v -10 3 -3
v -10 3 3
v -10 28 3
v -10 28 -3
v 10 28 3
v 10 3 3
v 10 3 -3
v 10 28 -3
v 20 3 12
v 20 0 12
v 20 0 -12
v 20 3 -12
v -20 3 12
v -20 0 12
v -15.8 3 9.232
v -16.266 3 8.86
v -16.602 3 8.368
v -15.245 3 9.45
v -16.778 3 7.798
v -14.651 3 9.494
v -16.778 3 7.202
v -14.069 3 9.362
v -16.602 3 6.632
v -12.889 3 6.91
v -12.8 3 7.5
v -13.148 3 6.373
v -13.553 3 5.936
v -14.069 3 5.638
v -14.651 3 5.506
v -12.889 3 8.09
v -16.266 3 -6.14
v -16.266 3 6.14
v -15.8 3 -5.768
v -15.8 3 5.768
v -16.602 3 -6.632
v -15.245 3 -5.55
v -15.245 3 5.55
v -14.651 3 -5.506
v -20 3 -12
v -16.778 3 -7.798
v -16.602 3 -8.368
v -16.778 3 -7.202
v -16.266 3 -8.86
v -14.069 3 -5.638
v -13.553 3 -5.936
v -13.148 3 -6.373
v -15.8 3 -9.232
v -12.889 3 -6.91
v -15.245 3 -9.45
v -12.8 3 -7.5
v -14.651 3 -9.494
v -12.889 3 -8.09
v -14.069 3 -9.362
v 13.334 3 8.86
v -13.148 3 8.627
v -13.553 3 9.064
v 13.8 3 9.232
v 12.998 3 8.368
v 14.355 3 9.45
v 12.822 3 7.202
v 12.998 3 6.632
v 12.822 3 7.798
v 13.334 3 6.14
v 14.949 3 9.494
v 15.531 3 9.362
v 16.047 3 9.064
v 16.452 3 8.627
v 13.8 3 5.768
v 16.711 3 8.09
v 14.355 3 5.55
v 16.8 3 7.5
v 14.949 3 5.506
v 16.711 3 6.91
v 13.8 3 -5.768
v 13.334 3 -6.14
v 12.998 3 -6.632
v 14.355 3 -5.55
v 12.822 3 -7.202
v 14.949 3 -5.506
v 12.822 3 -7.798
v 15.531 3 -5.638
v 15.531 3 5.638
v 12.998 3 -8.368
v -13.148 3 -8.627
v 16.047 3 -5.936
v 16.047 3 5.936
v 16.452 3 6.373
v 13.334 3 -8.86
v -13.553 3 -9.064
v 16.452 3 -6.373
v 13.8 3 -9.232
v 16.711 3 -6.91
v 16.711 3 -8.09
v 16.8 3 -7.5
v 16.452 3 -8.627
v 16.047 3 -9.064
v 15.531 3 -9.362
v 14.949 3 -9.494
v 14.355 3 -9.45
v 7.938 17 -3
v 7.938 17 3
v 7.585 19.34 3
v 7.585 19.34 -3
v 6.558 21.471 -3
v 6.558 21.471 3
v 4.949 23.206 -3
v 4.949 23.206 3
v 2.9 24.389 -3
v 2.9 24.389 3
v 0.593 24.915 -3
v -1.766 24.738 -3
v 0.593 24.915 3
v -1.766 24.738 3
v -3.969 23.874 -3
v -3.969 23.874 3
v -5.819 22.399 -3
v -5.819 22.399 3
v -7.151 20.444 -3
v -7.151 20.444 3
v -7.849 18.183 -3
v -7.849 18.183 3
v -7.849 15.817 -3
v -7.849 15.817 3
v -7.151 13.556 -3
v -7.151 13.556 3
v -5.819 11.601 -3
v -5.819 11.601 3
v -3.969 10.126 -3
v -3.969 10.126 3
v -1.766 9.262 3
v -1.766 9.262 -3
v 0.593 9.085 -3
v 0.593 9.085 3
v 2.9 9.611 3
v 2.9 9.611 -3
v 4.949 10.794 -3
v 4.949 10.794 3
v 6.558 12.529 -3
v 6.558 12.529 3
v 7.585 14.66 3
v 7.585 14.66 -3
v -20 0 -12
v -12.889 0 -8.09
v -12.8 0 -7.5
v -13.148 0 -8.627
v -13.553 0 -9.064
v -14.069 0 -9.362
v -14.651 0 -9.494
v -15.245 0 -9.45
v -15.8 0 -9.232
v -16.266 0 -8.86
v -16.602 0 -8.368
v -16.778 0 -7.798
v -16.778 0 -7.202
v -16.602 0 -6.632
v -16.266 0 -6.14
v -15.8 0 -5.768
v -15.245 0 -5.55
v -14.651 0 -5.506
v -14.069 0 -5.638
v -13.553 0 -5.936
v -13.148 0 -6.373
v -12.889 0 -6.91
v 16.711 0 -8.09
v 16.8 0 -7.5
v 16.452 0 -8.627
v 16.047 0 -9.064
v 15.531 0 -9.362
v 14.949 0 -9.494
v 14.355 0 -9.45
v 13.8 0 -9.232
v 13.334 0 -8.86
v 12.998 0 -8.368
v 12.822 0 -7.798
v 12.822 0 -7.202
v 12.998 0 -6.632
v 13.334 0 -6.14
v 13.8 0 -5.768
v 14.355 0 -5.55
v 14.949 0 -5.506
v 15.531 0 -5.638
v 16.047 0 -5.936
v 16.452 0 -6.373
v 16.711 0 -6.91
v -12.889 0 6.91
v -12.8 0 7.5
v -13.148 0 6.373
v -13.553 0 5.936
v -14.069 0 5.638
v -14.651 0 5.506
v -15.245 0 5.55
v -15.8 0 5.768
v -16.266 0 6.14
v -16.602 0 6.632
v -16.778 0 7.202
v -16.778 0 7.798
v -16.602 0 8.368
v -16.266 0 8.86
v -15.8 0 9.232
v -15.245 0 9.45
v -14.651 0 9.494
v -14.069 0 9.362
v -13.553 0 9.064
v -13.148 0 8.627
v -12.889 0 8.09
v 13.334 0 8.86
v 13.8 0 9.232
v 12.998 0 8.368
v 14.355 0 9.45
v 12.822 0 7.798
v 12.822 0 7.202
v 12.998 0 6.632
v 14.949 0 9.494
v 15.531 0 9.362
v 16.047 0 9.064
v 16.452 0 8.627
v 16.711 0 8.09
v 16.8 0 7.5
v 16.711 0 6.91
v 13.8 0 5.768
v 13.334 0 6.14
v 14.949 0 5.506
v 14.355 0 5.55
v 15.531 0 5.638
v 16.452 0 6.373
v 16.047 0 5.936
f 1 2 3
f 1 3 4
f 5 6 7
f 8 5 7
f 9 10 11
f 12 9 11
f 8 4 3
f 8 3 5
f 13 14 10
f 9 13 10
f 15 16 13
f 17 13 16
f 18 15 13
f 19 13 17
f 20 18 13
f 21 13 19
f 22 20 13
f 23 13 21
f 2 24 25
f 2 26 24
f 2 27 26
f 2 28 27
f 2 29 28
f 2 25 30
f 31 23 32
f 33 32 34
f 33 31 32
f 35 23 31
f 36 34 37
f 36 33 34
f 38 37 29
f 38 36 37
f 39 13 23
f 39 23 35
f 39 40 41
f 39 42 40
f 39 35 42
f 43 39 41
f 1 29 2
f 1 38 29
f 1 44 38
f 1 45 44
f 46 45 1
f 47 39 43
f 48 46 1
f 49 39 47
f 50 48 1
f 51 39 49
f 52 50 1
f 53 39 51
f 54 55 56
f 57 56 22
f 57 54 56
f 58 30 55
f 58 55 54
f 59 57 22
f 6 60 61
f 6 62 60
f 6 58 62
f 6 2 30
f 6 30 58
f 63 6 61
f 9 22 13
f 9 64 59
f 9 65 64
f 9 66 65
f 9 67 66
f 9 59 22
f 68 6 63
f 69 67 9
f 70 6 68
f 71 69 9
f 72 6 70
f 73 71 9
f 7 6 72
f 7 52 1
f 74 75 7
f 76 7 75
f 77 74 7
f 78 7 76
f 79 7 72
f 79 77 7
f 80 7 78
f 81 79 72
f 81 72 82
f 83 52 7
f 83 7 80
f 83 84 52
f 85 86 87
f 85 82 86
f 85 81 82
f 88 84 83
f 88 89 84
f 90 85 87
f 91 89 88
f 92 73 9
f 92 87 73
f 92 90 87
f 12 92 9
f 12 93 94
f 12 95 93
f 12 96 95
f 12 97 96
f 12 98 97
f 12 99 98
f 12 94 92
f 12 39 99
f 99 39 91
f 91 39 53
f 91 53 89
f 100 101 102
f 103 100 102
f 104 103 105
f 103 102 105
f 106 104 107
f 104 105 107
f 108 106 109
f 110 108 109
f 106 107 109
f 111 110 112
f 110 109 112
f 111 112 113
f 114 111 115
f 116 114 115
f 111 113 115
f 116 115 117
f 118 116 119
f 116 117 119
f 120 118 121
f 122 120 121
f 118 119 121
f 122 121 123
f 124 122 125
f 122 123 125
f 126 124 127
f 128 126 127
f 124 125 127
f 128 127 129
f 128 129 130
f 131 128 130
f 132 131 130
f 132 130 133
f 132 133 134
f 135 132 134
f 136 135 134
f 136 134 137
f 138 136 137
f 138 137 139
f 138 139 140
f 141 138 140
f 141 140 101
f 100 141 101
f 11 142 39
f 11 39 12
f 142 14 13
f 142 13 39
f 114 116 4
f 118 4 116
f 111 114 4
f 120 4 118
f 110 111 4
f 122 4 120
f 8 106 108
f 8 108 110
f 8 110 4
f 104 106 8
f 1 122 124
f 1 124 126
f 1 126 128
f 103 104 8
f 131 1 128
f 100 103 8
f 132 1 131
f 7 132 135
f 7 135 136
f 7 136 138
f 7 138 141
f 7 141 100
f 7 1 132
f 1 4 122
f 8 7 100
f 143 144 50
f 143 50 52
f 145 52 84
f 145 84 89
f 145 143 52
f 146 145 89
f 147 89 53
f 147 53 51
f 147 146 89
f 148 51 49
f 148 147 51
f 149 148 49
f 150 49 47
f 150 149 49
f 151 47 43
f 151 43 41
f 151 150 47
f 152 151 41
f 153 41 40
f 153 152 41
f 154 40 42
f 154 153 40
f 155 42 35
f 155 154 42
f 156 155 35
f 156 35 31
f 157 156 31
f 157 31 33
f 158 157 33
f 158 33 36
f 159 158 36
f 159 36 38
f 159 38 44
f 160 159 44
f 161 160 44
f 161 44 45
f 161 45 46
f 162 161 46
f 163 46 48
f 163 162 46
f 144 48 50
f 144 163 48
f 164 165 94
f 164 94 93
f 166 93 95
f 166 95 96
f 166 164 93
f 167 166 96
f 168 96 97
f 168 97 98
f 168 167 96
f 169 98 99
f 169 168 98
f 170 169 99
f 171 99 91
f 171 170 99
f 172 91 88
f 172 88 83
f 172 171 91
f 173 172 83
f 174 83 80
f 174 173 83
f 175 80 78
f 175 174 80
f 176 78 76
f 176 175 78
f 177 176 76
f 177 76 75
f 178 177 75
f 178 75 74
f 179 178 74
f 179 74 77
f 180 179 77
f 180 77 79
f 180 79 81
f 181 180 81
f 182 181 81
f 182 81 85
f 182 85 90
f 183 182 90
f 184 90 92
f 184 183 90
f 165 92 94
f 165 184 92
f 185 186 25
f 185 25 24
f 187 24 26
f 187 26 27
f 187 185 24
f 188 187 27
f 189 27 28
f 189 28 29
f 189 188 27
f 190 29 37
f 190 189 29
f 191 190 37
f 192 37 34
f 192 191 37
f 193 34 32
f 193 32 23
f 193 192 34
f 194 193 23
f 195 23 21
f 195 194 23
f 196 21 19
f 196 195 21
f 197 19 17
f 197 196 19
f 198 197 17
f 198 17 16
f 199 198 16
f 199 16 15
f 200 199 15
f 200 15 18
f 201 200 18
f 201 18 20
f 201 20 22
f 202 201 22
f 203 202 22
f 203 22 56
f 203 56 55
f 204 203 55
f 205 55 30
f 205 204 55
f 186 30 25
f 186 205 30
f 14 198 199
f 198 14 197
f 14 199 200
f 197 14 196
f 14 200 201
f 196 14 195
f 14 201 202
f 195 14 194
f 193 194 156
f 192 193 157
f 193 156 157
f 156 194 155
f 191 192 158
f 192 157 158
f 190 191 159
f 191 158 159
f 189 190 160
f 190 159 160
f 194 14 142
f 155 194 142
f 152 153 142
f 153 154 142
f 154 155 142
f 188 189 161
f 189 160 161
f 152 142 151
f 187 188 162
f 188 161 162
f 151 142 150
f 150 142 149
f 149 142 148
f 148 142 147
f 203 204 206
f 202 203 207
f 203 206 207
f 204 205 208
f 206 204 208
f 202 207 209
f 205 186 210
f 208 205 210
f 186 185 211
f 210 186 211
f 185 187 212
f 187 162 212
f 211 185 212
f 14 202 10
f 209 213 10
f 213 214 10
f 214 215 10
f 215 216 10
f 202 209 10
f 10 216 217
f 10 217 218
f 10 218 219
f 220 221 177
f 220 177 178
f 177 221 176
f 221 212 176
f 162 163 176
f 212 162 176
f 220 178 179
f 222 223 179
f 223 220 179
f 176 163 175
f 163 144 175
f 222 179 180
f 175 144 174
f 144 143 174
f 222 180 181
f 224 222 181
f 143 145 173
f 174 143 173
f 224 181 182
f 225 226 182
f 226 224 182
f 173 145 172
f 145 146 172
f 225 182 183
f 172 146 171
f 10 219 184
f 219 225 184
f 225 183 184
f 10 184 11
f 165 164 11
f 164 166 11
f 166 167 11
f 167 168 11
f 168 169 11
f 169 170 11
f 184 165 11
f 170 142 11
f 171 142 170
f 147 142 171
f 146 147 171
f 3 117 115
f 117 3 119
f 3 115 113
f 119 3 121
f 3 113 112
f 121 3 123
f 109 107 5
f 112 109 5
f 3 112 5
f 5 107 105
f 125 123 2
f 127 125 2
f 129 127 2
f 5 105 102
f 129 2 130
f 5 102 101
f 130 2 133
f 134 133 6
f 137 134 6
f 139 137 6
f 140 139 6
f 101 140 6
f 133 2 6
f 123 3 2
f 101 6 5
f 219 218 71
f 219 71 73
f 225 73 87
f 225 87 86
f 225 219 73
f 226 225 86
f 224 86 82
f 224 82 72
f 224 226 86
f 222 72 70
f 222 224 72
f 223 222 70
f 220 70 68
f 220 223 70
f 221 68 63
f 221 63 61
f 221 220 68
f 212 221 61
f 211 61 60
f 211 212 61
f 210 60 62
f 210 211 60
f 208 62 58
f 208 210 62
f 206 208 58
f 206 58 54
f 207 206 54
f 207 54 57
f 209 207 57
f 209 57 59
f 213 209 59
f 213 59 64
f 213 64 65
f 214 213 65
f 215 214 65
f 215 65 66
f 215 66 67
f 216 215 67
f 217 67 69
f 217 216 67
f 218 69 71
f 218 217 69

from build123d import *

# Parameters (mm, degrees)
SKETCH_1_W          = 40
SKETCH_1_H          = 24
SKETCH_1_R          = 2
EXTRUDE_1_DEPTH     = 3
SKETCH_2_W          = 20
SKETCH_2_H          = 6
EXTRUDE_2_DEPTH     = 25
SKETCH_3_R          = 7.9375
CUT_EXTRUDE_1_DEPTH = 10


with BuildPart() as part:
    # 草图1 → 凸台-拉伸1 (new body)
    with BuildSketch(Plane(origin=(0, 0, 0), x_dir=(1, 0, 0), z_dir=(0, 1, 0))):
        Rectangle(SKETCH_1_W, SKETCH_1_H)
        with Locations((-14.8, -7.5)):
            Circle(SKETCH_1_R, mode=Mode.SUBTRACT)
        with Locations((14.8, -7.5)):
            Circle(SKETCH_1_R, mode=Mode.SUBTRACT)
        with Locations((-14.8, 7.5)):
            Circle(SKETCH_1_R, mode=Mode.SUBTRACT)
        with Locations((14.8, 7.5)):
            Circle(SKETCH_1_R, mode=Mode.SUBTRACT)
    extrude(amount=EXTRUDE_1_DEPTH)

    # 草图2 → 凸台-拉伸2 (add)
    with BuildSketch(Plane(origin=(0, 3, 0), x_dir=(1, 0, 0), z_dir=(0, 1, 0))):
        Rectangle(SKETCH_2_W, SKETCH_2_H)
    extrude(amount=EXTRUDE_2_DEPTH)

    # 草图3 → 切除-拉伸1 (cut)
    with BuildSketch(Plane.XY.offset(3)):
        with Locations((0, 17)):
            Circle(SKETCH_3_R)
    extrude(amount=-CUT_EXTRUDE_1_DEPTH, mode=Mode.SUBTRACT)


solid = part.part
